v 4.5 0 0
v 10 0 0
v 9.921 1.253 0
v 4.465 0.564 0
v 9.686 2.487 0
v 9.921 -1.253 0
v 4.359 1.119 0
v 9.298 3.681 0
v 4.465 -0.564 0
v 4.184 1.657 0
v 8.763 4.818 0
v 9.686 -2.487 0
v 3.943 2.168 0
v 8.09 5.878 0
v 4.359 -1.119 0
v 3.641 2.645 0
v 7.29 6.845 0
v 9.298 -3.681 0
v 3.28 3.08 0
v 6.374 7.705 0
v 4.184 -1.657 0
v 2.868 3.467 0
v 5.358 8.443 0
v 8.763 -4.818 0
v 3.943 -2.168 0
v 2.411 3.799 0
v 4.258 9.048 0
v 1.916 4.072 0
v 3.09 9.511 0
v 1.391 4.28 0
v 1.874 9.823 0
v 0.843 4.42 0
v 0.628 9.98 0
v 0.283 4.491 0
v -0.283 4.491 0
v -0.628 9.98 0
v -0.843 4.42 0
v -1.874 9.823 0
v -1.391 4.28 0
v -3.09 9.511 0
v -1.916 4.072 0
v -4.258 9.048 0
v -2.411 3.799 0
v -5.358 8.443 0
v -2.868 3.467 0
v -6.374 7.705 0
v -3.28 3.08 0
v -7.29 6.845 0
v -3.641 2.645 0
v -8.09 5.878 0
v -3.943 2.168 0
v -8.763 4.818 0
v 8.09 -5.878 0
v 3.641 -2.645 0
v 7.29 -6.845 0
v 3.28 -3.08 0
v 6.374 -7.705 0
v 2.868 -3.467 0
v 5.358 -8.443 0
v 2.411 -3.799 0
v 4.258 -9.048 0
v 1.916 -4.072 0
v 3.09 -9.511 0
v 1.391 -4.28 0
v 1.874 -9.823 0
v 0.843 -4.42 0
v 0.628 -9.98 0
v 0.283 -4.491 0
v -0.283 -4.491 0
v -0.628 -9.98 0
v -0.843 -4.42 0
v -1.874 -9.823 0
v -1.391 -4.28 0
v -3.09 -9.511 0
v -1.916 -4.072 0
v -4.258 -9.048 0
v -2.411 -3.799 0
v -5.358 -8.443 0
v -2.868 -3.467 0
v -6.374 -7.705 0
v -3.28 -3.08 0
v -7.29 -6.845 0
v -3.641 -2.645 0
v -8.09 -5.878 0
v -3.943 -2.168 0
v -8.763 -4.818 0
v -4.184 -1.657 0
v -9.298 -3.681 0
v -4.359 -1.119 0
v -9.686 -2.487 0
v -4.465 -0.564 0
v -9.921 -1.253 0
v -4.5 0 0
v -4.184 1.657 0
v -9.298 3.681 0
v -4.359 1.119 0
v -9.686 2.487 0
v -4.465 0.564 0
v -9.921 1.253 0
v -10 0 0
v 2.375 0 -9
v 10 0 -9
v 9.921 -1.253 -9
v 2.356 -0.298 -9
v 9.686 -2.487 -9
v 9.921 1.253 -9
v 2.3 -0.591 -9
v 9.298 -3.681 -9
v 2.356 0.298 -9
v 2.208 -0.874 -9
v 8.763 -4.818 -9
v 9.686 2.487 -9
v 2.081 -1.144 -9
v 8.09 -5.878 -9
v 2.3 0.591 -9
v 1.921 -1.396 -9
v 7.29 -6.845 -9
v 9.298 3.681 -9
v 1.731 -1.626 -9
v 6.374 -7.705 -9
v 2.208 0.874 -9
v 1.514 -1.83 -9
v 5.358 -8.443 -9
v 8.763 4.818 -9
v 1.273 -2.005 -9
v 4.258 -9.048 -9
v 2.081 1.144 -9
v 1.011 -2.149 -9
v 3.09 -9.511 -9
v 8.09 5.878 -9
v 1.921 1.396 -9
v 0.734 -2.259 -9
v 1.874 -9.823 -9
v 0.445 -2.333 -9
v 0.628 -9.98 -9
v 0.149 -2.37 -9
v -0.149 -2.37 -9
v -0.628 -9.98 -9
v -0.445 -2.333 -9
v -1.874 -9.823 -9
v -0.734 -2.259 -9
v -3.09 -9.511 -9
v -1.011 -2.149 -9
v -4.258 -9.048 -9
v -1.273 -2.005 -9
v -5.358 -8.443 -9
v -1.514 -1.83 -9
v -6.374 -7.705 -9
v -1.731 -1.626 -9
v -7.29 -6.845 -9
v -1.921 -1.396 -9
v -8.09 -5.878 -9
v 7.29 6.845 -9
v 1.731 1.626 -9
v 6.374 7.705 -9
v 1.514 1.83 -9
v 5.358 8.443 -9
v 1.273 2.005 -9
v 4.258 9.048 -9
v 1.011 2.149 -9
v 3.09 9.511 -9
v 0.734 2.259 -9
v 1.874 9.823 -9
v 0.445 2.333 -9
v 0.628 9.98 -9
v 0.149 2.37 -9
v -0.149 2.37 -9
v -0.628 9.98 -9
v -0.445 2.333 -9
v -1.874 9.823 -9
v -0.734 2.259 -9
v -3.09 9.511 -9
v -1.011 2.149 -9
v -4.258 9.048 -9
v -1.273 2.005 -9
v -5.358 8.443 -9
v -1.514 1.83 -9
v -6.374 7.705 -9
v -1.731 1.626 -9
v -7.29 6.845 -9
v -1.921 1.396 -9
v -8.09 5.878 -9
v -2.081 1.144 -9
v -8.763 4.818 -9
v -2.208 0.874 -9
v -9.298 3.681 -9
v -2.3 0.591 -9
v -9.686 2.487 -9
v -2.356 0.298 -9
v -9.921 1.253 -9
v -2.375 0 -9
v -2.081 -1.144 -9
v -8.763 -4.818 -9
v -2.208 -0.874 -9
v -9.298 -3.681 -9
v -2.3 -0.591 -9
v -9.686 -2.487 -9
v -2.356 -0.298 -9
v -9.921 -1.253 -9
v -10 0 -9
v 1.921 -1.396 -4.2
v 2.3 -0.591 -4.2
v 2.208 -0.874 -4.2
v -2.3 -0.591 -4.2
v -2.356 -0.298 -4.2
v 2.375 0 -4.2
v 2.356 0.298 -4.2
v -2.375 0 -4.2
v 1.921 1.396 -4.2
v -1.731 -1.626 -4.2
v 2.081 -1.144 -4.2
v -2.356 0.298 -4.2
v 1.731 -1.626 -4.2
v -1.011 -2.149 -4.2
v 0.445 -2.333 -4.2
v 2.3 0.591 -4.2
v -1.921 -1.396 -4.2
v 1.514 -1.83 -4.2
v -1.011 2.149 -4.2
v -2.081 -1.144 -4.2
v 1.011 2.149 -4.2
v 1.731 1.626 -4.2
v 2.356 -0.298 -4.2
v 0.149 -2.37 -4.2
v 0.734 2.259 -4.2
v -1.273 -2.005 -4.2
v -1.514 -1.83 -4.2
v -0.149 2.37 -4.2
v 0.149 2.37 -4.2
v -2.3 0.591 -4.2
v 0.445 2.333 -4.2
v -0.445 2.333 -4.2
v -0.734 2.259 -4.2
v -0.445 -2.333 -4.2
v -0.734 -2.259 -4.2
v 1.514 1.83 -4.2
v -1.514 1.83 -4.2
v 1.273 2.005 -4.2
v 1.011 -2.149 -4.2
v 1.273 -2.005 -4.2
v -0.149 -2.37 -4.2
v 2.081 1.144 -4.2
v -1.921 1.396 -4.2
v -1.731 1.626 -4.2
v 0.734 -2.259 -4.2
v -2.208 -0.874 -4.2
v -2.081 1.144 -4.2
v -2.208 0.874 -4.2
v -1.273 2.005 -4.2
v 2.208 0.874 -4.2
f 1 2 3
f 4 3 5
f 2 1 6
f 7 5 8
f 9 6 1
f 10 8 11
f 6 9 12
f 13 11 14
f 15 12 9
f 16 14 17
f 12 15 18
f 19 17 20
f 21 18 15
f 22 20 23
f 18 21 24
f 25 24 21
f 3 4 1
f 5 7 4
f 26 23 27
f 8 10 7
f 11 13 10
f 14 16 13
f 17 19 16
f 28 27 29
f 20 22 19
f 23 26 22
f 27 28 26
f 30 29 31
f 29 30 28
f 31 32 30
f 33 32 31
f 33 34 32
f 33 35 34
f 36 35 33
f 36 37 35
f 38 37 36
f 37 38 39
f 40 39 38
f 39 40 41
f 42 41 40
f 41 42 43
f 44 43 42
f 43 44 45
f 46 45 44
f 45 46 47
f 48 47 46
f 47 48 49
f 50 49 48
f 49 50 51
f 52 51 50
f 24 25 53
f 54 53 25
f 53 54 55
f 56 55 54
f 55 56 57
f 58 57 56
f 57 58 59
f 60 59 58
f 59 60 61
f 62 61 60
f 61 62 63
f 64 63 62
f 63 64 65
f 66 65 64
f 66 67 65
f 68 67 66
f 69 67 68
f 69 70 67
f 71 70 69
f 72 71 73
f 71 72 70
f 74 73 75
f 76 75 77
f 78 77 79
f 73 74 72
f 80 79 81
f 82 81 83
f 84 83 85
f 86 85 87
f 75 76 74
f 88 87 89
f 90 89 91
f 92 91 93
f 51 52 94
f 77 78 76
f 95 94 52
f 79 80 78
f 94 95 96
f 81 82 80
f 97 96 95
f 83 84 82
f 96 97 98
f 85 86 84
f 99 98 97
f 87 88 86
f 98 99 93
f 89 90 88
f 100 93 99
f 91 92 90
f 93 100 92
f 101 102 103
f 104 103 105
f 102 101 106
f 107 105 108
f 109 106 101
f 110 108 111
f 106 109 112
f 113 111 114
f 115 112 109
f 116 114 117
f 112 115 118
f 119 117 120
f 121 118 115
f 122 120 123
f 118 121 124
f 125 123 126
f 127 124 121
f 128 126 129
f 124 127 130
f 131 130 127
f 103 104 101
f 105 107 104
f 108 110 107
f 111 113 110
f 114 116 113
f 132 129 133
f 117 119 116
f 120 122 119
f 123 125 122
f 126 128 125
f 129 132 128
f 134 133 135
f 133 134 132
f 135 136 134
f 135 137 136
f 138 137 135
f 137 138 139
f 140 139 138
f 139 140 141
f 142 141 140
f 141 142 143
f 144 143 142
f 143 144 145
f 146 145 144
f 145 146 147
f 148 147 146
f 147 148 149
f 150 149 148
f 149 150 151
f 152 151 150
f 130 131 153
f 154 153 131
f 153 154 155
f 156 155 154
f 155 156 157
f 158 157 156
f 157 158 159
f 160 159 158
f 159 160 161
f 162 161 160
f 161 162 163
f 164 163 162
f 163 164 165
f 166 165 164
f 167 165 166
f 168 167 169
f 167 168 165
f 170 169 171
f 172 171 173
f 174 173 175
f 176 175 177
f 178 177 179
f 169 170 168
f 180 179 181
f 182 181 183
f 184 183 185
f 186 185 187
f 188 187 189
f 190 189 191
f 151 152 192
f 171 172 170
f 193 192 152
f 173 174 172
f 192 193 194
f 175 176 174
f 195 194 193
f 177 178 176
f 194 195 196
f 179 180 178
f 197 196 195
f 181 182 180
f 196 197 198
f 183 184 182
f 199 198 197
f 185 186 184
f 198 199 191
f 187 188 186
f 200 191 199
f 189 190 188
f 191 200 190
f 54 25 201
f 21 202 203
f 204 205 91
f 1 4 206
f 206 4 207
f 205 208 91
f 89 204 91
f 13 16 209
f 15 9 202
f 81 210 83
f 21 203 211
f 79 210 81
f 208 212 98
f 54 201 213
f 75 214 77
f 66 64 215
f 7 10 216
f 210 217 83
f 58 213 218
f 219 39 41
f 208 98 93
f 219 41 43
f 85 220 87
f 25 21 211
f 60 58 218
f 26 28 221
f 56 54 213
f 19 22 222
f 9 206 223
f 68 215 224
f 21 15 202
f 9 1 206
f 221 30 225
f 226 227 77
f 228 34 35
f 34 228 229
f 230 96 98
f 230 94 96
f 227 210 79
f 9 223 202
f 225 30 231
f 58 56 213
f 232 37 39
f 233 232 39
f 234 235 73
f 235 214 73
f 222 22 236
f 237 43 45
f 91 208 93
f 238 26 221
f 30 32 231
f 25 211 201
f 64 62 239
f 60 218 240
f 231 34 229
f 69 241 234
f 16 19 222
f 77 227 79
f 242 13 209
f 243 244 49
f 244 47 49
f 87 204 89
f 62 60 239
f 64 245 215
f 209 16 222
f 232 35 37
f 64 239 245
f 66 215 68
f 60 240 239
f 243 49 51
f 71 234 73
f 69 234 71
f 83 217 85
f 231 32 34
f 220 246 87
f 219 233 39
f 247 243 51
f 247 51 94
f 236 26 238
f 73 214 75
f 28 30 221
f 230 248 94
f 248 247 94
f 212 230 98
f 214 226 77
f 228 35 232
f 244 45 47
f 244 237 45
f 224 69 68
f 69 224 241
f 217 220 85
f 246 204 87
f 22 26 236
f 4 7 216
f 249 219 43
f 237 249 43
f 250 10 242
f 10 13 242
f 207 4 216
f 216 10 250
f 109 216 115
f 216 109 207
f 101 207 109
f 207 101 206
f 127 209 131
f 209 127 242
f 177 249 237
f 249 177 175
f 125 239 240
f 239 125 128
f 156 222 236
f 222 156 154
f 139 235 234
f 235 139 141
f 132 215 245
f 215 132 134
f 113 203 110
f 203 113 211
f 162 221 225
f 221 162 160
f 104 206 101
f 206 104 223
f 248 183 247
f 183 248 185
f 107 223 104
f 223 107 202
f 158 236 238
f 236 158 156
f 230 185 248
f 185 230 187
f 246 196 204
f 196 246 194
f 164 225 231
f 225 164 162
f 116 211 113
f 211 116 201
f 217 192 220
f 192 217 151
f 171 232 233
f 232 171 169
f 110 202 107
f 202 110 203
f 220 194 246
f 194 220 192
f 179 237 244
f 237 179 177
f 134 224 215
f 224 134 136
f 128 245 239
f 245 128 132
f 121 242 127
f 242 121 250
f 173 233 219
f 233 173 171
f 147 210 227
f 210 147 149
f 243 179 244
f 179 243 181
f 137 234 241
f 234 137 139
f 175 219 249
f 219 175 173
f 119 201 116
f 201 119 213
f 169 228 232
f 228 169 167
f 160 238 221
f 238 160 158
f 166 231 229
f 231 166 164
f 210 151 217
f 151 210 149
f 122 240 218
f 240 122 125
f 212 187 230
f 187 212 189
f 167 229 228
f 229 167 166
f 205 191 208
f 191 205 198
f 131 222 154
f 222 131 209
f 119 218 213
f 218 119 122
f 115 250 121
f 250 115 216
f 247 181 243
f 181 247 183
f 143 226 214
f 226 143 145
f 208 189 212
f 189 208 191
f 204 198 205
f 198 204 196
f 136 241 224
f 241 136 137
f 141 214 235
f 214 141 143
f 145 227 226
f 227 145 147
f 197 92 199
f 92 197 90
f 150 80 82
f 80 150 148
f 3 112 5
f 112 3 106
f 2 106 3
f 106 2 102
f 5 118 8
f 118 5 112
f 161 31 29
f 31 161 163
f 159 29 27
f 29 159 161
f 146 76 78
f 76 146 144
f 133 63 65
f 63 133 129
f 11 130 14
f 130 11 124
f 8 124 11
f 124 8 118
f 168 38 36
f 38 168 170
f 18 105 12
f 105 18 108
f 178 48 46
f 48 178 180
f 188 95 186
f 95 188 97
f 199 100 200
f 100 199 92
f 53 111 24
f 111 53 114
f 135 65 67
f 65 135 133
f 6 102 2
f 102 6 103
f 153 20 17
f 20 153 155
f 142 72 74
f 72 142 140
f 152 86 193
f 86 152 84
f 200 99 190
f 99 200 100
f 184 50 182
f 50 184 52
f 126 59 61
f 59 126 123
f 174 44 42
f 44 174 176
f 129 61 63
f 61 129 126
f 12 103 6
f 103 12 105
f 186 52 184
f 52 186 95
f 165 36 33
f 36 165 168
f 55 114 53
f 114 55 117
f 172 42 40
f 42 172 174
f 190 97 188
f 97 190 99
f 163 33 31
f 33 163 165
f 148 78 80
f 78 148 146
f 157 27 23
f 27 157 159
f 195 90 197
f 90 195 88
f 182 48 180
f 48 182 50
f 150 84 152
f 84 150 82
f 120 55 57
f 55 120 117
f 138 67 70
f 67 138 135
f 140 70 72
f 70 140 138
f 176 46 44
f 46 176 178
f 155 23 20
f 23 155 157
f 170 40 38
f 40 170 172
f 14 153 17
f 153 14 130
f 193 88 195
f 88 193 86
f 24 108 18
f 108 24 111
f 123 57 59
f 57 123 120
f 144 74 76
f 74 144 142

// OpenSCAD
$fn = 50;


difference() {
	union() {
		translate(v = [0, 0, -9.0000000000]) {
			cylinder(h = 9, r = 10.0000000000);
		}
		cylinder(h = 0, r = 13.0000000000);
	}
	union() {
		translate(v = [0, 0, 0]) {
			rotate(a = [0, 0, 0]) {
				difference() {
					union() {
						#translate(v = [0, 0, -9.0000000000]) {
							cylinder(h = 9, r = 2.2500000000);
						}
						#translate(v = [0, 0, -4.2000000000]) {
							cylinder(h = 4.2000000000, r1 = 2.3750000000, r2 = 4.5000000000);
						}
						#translate(v = [0, 0, -9.0000000000]) {
							cylinder(h = 9, r = 2.3750000000);
						}
						#translate(v = [0, 0, -9.0000000000]) {
							cylinder(h = 9, r = 2.2500000000);
						}
					}
					union();
				}
			}
		}
	}
}
